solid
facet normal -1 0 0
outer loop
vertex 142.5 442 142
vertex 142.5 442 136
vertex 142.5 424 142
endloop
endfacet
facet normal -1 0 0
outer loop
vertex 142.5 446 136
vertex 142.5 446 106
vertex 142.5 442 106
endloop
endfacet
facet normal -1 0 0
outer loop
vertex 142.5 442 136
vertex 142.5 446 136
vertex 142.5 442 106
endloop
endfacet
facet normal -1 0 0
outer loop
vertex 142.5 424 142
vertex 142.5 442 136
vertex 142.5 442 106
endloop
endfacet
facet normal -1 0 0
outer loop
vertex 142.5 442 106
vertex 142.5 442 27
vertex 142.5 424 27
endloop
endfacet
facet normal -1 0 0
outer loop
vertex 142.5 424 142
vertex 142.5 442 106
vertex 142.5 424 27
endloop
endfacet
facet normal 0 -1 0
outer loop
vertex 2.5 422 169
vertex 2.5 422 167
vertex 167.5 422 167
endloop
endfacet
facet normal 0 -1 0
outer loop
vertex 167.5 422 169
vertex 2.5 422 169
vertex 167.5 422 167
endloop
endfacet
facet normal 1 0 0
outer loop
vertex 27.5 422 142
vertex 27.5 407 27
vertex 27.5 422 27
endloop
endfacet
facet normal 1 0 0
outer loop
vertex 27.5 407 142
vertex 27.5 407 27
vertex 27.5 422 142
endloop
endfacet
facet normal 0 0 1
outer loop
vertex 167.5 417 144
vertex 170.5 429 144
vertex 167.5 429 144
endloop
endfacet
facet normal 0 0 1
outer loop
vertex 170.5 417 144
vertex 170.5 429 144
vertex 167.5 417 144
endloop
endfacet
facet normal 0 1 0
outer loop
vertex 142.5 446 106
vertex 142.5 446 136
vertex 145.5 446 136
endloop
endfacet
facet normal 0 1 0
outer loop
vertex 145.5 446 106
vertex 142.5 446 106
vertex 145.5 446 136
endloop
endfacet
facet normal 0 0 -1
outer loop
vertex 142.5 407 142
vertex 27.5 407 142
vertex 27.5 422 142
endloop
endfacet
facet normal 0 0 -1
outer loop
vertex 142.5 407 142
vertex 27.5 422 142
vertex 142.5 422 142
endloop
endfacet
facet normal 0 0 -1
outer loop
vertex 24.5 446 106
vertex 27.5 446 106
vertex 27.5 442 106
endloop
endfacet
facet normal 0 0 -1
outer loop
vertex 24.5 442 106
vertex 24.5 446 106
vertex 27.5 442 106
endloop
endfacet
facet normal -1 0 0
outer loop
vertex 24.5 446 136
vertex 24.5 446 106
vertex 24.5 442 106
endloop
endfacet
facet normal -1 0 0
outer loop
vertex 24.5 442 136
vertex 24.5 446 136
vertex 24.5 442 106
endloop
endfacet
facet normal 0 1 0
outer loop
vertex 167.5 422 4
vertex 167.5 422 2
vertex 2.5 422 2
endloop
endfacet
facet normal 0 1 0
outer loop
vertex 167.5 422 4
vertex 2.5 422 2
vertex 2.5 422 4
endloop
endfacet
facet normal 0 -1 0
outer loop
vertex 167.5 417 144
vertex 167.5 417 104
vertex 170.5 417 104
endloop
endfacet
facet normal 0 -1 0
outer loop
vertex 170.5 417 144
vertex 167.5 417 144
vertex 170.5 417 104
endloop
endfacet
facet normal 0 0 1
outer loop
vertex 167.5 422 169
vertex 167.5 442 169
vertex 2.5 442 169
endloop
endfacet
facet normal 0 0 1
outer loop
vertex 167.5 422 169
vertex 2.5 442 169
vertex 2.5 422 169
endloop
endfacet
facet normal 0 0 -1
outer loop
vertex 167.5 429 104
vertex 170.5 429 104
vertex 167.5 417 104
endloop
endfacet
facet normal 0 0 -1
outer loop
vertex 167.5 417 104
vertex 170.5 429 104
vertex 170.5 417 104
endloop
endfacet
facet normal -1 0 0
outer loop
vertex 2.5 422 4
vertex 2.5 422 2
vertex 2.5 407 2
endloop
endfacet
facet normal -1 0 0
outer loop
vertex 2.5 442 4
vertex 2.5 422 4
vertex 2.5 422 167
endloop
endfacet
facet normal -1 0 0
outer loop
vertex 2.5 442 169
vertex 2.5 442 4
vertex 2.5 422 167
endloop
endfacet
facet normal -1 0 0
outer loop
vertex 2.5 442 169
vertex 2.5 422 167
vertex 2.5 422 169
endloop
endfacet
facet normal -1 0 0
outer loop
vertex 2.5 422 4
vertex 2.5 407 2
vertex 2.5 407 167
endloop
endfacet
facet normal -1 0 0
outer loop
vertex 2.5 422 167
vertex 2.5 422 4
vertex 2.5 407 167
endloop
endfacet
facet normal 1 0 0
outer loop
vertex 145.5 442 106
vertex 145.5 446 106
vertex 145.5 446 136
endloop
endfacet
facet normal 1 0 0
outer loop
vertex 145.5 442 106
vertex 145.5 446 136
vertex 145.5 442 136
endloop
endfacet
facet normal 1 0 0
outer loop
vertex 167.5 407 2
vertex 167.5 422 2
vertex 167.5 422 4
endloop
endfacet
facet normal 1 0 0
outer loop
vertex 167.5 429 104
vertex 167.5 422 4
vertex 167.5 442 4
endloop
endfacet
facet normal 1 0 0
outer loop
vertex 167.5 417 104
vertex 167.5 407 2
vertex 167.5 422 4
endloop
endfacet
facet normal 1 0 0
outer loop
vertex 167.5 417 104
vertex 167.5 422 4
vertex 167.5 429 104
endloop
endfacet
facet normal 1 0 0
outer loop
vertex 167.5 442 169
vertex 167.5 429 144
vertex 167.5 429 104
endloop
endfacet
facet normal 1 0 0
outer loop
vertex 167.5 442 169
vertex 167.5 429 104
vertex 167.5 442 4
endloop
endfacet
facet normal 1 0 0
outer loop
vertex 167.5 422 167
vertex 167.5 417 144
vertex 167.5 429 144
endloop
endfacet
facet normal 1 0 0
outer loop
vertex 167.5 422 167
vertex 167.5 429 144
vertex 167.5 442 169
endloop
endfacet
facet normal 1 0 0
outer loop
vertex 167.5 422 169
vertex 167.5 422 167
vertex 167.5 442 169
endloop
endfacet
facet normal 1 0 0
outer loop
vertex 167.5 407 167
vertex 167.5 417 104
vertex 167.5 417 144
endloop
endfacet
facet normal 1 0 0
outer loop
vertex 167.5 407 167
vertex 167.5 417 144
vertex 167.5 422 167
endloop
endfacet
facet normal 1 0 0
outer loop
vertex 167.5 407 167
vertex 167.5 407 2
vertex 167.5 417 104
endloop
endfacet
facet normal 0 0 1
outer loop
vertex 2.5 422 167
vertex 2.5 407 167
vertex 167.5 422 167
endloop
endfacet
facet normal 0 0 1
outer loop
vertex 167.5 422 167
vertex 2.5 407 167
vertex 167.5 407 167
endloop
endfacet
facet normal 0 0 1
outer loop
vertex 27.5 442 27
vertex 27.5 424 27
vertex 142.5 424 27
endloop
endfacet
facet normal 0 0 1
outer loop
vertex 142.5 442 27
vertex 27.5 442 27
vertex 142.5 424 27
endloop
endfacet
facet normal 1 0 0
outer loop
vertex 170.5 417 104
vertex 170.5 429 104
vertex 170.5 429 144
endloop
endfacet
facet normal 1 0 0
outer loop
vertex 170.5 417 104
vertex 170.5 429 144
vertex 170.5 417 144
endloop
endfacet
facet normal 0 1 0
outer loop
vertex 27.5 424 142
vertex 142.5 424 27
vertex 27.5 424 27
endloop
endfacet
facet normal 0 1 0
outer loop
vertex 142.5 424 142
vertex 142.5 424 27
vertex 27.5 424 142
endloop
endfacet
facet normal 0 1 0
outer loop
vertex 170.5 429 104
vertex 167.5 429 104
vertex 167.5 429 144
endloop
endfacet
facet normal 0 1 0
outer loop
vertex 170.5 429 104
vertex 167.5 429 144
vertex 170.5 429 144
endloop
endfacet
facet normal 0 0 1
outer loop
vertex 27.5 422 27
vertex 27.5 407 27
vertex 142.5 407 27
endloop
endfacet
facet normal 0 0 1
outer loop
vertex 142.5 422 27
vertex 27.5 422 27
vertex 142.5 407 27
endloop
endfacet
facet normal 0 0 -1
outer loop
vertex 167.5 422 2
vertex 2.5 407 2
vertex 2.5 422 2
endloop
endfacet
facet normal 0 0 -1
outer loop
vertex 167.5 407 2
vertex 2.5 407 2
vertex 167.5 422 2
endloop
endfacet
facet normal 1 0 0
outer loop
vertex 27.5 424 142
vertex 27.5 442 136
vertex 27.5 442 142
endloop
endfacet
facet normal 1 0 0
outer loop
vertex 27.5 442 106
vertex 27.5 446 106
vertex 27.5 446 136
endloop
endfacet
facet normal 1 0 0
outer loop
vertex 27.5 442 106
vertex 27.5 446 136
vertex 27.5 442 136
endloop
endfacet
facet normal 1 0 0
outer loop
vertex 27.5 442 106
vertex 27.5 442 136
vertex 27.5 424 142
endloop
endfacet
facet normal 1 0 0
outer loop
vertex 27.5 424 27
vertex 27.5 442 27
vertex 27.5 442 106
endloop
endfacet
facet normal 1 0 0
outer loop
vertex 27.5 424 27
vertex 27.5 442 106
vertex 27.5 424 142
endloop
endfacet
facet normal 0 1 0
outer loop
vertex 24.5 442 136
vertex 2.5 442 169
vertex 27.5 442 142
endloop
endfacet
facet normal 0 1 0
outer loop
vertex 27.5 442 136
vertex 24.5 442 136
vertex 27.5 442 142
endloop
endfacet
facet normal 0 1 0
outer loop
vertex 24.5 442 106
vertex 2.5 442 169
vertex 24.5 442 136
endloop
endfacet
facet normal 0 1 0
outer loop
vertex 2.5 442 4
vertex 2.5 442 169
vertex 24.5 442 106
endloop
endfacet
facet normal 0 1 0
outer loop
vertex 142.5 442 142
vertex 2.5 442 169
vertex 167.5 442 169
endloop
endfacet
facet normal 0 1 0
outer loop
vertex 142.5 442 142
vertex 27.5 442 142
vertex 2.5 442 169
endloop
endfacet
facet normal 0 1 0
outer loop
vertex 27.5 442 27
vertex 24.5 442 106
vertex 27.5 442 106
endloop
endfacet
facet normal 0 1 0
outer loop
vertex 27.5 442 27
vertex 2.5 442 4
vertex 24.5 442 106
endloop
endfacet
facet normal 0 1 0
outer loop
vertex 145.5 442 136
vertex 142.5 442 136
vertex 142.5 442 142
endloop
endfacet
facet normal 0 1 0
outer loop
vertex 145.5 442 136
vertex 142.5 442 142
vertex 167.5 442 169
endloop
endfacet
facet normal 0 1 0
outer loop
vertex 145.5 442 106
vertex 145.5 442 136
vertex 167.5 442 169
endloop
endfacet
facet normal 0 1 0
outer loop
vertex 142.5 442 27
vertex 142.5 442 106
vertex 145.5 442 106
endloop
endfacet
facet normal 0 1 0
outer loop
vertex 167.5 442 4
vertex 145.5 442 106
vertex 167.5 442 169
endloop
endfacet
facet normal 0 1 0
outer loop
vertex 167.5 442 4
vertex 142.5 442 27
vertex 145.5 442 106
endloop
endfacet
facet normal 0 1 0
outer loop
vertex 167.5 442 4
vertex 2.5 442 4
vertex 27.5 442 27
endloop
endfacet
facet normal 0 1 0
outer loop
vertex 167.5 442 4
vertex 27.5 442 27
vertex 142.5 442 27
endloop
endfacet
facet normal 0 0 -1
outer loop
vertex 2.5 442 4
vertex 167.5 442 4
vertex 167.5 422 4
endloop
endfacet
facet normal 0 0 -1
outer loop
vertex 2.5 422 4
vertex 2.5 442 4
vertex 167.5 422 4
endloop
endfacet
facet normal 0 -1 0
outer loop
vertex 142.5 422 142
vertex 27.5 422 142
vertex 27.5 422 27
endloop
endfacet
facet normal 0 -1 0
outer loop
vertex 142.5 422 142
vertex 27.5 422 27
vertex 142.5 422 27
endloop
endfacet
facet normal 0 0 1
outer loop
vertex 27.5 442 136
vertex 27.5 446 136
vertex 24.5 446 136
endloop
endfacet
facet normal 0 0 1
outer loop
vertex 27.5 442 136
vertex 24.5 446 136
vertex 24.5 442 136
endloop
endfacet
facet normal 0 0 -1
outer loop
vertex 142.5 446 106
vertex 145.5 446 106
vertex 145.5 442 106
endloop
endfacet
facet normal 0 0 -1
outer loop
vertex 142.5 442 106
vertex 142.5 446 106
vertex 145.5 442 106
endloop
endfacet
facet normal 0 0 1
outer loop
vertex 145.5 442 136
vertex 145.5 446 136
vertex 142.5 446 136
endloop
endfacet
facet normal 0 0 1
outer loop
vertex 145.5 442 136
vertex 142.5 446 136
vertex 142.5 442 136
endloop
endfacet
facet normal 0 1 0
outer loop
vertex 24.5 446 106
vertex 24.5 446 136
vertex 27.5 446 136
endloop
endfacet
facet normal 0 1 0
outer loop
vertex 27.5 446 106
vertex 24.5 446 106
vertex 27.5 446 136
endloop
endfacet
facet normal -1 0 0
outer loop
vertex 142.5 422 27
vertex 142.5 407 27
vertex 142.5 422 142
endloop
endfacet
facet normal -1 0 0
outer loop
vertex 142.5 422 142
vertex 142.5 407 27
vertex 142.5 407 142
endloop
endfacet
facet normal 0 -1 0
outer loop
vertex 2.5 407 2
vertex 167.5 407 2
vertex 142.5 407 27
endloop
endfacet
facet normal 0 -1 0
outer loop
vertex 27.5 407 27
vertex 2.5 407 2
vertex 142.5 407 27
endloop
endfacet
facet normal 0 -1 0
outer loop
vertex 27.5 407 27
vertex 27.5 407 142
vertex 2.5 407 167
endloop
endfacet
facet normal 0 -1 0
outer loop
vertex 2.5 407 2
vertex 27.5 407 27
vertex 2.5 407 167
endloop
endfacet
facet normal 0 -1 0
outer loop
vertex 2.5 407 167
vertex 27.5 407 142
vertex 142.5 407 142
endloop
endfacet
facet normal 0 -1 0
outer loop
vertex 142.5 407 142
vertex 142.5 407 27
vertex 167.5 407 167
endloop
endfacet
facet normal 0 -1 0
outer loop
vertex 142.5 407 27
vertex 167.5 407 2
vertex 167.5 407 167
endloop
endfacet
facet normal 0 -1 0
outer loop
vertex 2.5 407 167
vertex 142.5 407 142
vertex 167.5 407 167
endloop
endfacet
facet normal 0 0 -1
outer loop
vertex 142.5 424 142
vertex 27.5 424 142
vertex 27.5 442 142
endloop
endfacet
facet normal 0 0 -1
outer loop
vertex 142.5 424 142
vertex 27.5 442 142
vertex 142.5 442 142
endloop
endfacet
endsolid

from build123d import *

# Parameters (mm, degrees)
BOX024_W                  = 115
BOX024_H                  = 115
BOX024_DEPTH              = 2
BOX023_W                  = 115
BOX023_H                  = 115
BOX023_DEPTH              = 60
BOX022_W                  = 20
BOX022_H                  = 165
BOX022_DEPTH              = 165
BOX025_W                  = 9
BOX025_H                  = 3
BOX025_DEPTH              = 30
BOX026_W                  = 9
BOX026_H                  = 3
BOX026_DEPTH              = 30
BOX021_W                  = 115
BOX021_H                  = 115
BOX021_DEPTH              = 60
BOX020_W                  = 165
BOX020_H                  = 165
BOX020_DEPTH              = 15
CUT006_PLACEMENT_ANGLE    = 90
BOX027_W                  = 12
BOX027_H                  = 5
BOX027_DEPTH              = 40
FUSION003_PLACEMENT_ANGLE = 90


with BuildPart() as cube019:
    # Box024 → Box024 (new body)
    with BuildSketch(Plane(origin=(129, -57, 61), x_dir=(0, 0, 1), z_dir=(-1, 0, 0))):
        with Locations((57.5, 57.5)):
            Rectangle(BOX024_W, BOX024_H)
    extrude(amount=BOX024_DEPTH)


with BuildPart() as cube018:
    # Box023 → Box023 (new body)
    with BuildSketch(Plane(origin=(149, -57, 61), x_dir=(0, 0, 1), z_dir=(-1, 0, 0))):
        with Locations((57.5, 57.5)):
            Rectangle(BOX023_W, BOX023_H)
    extrude(amount=BOX023_DEPTH)


with BuildPart() as cut007:
    # Box022 → Box022 (new body)
    with BuildSketch(Plane(origin=(109, -82, 38), x_dir=(1, 0, 0), z_dir=(0, 0, 1))):
        with Locations((10, 82.5)):
            Rectangle(BOX022_W, BOX022_H)
    extrude(amount=BOX022_DEPTH)

    # Cut007: cut Cube018
    add(cube018.part, mode=Mode.SUBTRACT)


with BuildPart() as cube020:
    # Box025 → Box025 (new body)
    with BuildSketch(Plane(origin=(105, -60, 140), x_dir=(1, 0, 0), z_dir=(0, 0, 1))):
        with Locations((4.5, 1.5)):
            Rectangle(BOX025_W, BOX025_H)
    extrude(amount=BOX025_DEPTH)


with BuildPart() as cube021:
    # Box026 → Box026 (new body)
    with BuildSketch(Plane(origin=(105, 58, 140), x_dir=(1, 0, 0), z_dir=(0, 0, 1))):
        with Locations((4.5, 1.5)):
            Rectangle(BOX026_W, BOX026_H)
    extrude(amount=BOX026_DEPTH)


with BuildPart() as cube016:
    # Box021 → Box021 (new body)
    with BuildSketch(Plane(origin=(25, 25, -7), x_dir=(1, 0, 0), z_dir=(0, 0, 1))):
        with Locations((57.5, 57.5)):
            Rectangle(BOX021_W, BOX021_H)
    extrude(amount=BOX021_DEPTH)


with BuildPart() as bellows001:
    # Box020 → Box020 (new body)
    with BuildSketch(Plane.XY):
        with Locations((82.5, 82.5)):
            Rectangle(BOX020_W, BOX020_H)
    extrude(amount=BOX020_DEPTH)

    # Cut006: cut Cube016
    add(cube016.part, mode=Mode.SUBTRACT)


with BuildPart() as bellows001_1:
    # Cut006 placement: moved
    add(bellows001.part.moved(Location((144, -82, 36))).rotate(Axis((144, -82, 36), (0, -1, 0)), CUT006_PLACEMENT_ANGLE))


with BuildPart() as ground_glass:
    # Box027 → Box027 (new body)
    with BuildSketch(Plane(origin=(122, 81, 138), x_dir=(1, 0, 0), z_dir=(0, 0, 1))):
        with Locations((6, 2.5)):
            Rectangle(BOX027_W, BOX027_H)
    extrude(amount=BOX027_DEPTH)

    # Fusion003: union Cube019, Cut007, Cube020, Cube021, bellows001
    add(cube019.part)
    add(cut007.part)
    add(cube020.part)
    add(cube021.part)
    add(bellows001_1.part)


with BuildPart() as ground_glass_1:
    # Fusion003 placement: moved
    add(ground_glass.part.moved(Location((84.5, 551, -34))).rotate(Axis((84.5, 551, -34), (0, 0, -1)), FUSION003_PLACEMENT_ANGLE))


solid = ground_glass_1.part
